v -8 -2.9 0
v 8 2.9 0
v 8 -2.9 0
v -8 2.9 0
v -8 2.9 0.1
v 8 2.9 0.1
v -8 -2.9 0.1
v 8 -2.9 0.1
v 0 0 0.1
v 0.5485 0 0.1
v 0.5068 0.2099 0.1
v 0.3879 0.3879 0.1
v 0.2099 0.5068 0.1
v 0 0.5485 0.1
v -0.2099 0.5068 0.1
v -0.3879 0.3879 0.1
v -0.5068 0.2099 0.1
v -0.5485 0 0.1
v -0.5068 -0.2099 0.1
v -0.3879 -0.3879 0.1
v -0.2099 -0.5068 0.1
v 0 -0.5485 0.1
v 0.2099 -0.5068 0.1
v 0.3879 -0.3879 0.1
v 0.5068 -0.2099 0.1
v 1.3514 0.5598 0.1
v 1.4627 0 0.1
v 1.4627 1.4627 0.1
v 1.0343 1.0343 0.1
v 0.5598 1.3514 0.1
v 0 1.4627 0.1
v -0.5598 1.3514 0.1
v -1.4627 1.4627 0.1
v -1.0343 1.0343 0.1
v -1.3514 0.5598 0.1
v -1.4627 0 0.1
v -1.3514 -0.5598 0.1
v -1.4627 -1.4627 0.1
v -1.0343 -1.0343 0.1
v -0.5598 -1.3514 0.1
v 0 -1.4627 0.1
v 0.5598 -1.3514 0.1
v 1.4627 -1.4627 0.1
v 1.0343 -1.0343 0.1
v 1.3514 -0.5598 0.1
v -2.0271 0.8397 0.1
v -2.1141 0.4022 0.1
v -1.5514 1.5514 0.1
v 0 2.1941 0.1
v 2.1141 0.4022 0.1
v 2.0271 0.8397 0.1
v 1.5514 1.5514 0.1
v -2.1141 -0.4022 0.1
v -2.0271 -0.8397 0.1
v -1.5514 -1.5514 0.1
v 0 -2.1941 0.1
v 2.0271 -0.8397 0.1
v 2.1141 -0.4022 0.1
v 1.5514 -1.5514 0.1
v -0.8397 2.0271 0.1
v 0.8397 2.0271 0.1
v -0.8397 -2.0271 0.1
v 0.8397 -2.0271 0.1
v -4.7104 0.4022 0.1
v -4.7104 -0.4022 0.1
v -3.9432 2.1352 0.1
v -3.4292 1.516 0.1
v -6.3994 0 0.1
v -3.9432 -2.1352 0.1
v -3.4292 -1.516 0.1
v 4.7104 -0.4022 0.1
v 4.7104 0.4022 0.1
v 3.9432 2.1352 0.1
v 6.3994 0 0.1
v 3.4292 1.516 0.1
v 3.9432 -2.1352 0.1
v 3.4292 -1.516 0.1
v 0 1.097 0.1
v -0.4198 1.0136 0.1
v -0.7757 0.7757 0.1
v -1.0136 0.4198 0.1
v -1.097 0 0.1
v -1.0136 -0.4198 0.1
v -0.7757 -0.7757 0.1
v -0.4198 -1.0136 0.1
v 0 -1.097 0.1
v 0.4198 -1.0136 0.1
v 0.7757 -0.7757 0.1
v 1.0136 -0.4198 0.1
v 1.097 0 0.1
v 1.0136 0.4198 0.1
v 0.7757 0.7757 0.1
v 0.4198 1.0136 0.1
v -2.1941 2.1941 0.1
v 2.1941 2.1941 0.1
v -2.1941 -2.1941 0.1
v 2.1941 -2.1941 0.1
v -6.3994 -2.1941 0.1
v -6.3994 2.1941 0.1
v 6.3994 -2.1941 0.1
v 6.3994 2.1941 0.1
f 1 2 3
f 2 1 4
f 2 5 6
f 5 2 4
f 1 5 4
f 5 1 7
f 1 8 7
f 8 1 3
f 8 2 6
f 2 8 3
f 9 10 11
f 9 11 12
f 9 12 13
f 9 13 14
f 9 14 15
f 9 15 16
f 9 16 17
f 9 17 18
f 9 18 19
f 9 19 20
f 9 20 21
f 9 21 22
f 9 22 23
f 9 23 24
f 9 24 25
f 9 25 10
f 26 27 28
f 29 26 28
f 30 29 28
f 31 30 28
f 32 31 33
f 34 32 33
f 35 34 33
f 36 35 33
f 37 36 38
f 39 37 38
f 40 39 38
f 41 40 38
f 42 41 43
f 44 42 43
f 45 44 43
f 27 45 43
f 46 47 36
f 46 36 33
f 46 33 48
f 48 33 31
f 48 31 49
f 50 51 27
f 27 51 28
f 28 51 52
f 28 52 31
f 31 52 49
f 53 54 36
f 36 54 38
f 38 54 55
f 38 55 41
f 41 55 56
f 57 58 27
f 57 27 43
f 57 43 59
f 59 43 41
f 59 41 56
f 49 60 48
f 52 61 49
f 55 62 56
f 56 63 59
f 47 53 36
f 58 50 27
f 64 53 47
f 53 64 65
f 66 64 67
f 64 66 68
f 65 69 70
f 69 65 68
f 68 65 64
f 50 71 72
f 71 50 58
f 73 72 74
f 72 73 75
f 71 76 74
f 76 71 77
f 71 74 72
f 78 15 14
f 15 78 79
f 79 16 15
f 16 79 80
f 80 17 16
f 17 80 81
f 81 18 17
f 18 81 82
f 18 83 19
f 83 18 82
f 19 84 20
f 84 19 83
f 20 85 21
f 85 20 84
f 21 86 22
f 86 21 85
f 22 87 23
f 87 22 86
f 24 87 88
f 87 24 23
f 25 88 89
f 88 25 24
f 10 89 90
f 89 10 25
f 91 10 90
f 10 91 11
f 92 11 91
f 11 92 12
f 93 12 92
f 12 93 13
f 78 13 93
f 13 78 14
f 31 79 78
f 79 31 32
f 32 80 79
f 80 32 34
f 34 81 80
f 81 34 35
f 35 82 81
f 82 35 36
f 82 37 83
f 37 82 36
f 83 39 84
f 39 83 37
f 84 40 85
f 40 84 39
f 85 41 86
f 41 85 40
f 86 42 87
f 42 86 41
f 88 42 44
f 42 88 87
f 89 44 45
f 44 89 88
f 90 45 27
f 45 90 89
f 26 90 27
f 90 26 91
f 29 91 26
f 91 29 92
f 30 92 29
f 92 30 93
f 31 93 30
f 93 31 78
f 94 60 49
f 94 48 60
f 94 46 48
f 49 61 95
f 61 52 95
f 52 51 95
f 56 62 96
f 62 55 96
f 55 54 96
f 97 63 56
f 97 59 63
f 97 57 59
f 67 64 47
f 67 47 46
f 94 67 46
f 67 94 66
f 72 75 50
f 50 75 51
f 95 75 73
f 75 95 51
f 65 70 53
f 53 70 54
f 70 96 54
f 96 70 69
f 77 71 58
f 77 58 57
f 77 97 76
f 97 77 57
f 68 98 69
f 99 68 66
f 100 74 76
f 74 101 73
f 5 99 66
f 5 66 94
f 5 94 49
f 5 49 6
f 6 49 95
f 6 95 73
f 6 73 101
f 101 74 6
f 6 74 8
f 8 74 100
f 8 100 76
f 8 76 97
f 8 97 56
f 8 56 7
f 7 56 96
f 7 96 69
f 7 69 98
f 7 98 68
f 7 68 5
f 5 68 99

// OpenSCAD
// file: ../p/empty.scad
use <../lib.scad>
function ldraw_lib__empty() = [
// 0 Empty
// 0 Name: empty.dat
// 0 Author: Steffen [Steffen]
// 0 !LDRAW_ORG Primitive UPDATE 2015-01
// 0 !LICENSE Licensed under CC BY 4.0 : see CAreadme.txt
// 
// 0 BFC CERTIFY CCW
  [0,"BFC","CERTIFY"],
  [0,"BFC","CCW"],
// 
// 0 !HISTORY 2015-10-11 [PTadmin] Official Update 2015-01
// 
// 
// 0 // Tool MLCad cannot handle really empty files. This file is used as a workaround.
// 0 // It exceptionally contains forbidden non-LDRAW standard syntax to satisfy MLCad until it is fixed OR a different editor has become the de-facto LDRAW standard.
// 0 // The line being used here is an "impossible" conditional line which never should be visible,
// 0 // additionally hidden by a syntax explicitly hiding it from displaying.
// 
// 0 MLCAD HIDE 5 24 0 0 0 0.0001 0 0 0.0001 -0.0001 0 0 0 0
];
module ldraw_lib__empty(step=0, col=false, unit=2/5, alt=false, line=0.2, solid=!$preview)
    makepoly(ldraw_lib__empty(), step=step, col=col, unit=unit, alt=alt, line=line, solid=solid);
ldraw_lib__empty(line=0.2);
// file: ../p/4-4ndis.scad
use <../lib.scad>
function ldraw_lib__4_4ndis() = [
// 0 Disc Negative 1.0
// 0 Name: 4-4ndis.dat
// 0 Author: James Jessiman
// 0 !LDRAW_ORG Primitive UPDATE 2012-01
// 0 !LICENSE Licensed under CC BY 4.0 : see CAreadme.txt
// 
// 0 BFC CERTIFY CCW
  [0,"BFC","CERTIFY"],
  [0,"BFC","CCW"],
// 
// 0 !HISTORY 2002-03-23 [sbliss] Added BFC statement; compacted code
// 0 !HISTORY 2002-04-25 [PTadmin] Official Update 2002-02
// 0 !HISTORY 2007-06-24 [PTadmin] Header formatted for Contributor Agreement
// 0 !HISTORY 2008-07-01 [PTadmin] Official Update 2008-01
// 0 !HISTORY 2012-02-16 [Philo] Changed to CCW
// 0 !HISTORY 2012-03-30 [PTadmin] Official Update 2012-01
// 
// 
// 3 16 0.9239 0 0.3827 1 0 0 1 0 1
  [3,16,0.9239,0,0.3827,1,0,0,1,0,1],
// 3 16 0.7071 0 0.7071 0.9239 0 0.3827 1 0 1
  [3,16,0.7071,0,0.7071,0.9239,0,0.3827,1,0,1],
// 3 16 0.3827 0 0.9239 0.7071 0 0.7071 1 0 1
  [3,16,0.3827,0,0.9239,0.7071,0,0.7071,1,0,1],
// 3 16 0 0 1 0.3827 0 0.9239 1 0 1
  [3,16,0,0,1,0.3827,0,0.9239,1,0,1],
// 3 16 -0.3827 0 0.9239 0 0 1 -1 0 1
  [3,16,-0.3827,0,0.9239,0,0,1,-1,0,1],
// 3 16 -0.7071 0 0.7071 -0.3827 0 0.9239 -1 0 1
  [3,16,-0.7071,0,0.7071,-0.3827,0,0.9239,-1,0,1],
// 3 16 -0.9239 0 0.3827 -0.7071 0 0.7071 -1 0 1
  [3,16,-0.9239,0,0.3827,-0.7071,0,0.7071,-1,0,1],
// 3 16 -1 0 0 -0.9239 0 0.3827 -1 0 1
  [3,16,-1,0,0,-0.9239,0,0.3827,-1,0,1],
// 3 16 -0.9239 0 -0.3827 -1 0 0 -1 0 -1
  [3,16,-0.9239,0,-0.3827,-1,0,0,-1,0,-1],
// 3 16 -0.7071 0 -0.7071 -0.9239 0 -0.3827 -1 0 -1
  [3,16,-0.7071,0,-0.7071,-0.9239,0,-0.3827,-1,0,-1],
// 3 16 -0.3827 0 -0.9239 -0.7071 0 -0.7071 -1 0 -1
  [3,16,-0.3827,0,-0.9239,-0.7071,0,-0.7071,-1,0,-1],
// 3 16 0 0 -1 -0.3827 0 -0.9239 -1 0 -1
  [3,16,0,0,-1,-0.3827,0,-0.9239,-1,0,-1],
// 3 16 0.3827 0 -0.9239 0 0 -1 1 0 -1
  [3,16,0.3827,0,-0.9239,0,0,-1,1,0,-1],
// 3 16 0.7071 0 -0.7071 0.3827 0 -0.9239 1 0 -1
  [3,16,0.7071,0,-0.7071,0.3827,0,-0.9239,1,0,-1],
// 3 16 0.9239 0 -0.3827 0.7071 0 -0.7071 1 0 -1
  [3,16,0.9239,0,-0.3827,0.7071,0,-0.7071,1,0,-1],
// 3 16 1 0 0 0.9239 0 -0.3827 1 0 -1
  [3,16,1,0,0,0.9239,0,-0.3827,1,0,-1],
];
module ldraw_lib__4_4ndis(step=0, col=false, unit=2/5, alt=false, line=0.2, solid=!$preview)
    makepoly(ldraw_lib__4_4ndis(), step=step, col=col, unit=unit, alt=alt, line=line, solid=solid);
ldraw_lib__4_4ndis(line=0.2);
// file: ../p/4-4disc.scad
use <../lib.scad>
function ldraw_lib__4_4disc() = [
// 0 Disc 1.0
// 0 Name: 4-4disc.dat
// 0 Author: James Jessiman
// 0 !LDRAW_ORG Primitive UPDATE 2002-02
// 0 !LICENSE Licensed under CC BY 4.0 : see CAreadme.txt
// 
// 0 BFC CERTIFY CCW
  [0,"BFC","CERTIFY"],
  [0,"BFC","CCW"],
// 
// 0 !HISTORY 1998-12-15 [PTadmin] Official Update 1998-10
// 0 !HISTORY 2002-03-23 [sbliss] Added BFC statement
// 0 !HISTORY 2002-04-25 [PTadmin] Official Update 2002-02
// 0 !HISTORY 2007-06-24 [PTadmin] Header formatted for Contributor Agreement
// 0 !HISTORY 2008-07-01 [PTadmin] Official Update 2008-01
// 
// 
// 3 16 0 0 0 1 0 0 0.9239 0 0.3827
  [3,16,0,0,0,1,0,0,0.9239,0,0.3827],
// 3 16 0 0 0 0.9239 0 0.3827 0.7071 0 0.7071
  [3,16,0,0,0,0.9239,0,0.3827,0.7071,0,0.7071],
// 3 16 0 0 0 0.7071 0 0.7071 0.3827 0 0.9239
  [3,16,0,0,0,0.7071,0,0.7071,0.3827,0,0.9239],
// 3 16 0 0 0 0.3827 0 0.9239 0 0 1
  [3,16,0,0,0,0.3827,0,0.9239,0,0,1],
// 3 16 0 0 0 0 0 1 -0.3827 0 0.9239
  [3,16,0,0,0,0,0,1,-0.3827,0,0.9239],
// 3 16 0 0 0 -0.3827 0 0.9239 -0.7071 0 0.7071
  [3,16,0,0,0,-0.3827,0,0.9239,-0.7071,0,0.7071],
// 3 16 0 0 0 -0.7071 0 0.7071 -0.9239 0 0.3827
  [3,16,0,0,0,-0.7071,0,0.7071,-0.9239,0,0.3827],
// 3 16 0 0 0 -0.9239 0 0.3827 -1 0 -0
  [3,16,0,0,0,-0.9239,0,0.3827,-1,0,-0],
// 3 16 0 0 0 -1 0 -0 -0.9239 0 -0.3827
  [3,16,0,0,0,-1,0,-0,-0.9239,0,-0.3827],
// 3 16 0 0 0 -0.9239 0 -0.3827 -0.7071 0 -0.7071
  [3,16,0,0,0,-0.9239,0,-0.3827,-0.7071,0,-0.7071],
// 3 16 0 0 0 -0.7071 0 -0.7071 -0.3827 0 -0.9239
  [3,16,0,0,0,-0.7071,0,-0.7071,-0.3827,0,-0.9239],
// 3 16 0 0 0 -0.3827 0 -0.9239 0 0 -1
  [3,16,0,0,0,-0.3827,0,-0.9239,0,0,-1],
// 3 16 0 0 0 0 0 -1 0.3827 0 -0.9239
  [3,16,0,0,0,0,0,-1,0.3827,0,-0.9239],
// 3 16 0 0 0 0.3827 0 -0.9239 0.7071 0 -0.7071
  [3,16,0,0,0,0.3827,0,-0.9239,0.7071,0,-0.7071],
// 3 16 0 0 0 0.7071 0 -0.7071 0.9239 0 -0.3827
  [3,16,0,0,0,0.7071,0,-0.7071,0.9239,0,-0.3827],
// 3 16 0 0 0 0.9239 0 -0.3827 1 0 0
  [3,16,0,0,0,0.9239,0,-0.3827,1,0,0],
// 0
];
module ldraw_lib__4_4disc(step=0, col=false, unit=2/5, alt=false, line=0.2, solid=!$preview)
    makepoly(ldraw_lib__4_4disc(), step=step, col=col, unit=unit, alt=alt, line=line, solid=solid);
ldraw_lib__4_4disc(line=0.2);
// file: ../p/1-8chrd.scad
use <../lib.scad>
function ldraw_lib__1_8chrd() = [
// 0 Chord 0.125
// 0 Name: 1-8chrd.dat
// 0 Author: Orion Pobursky [OrionP]
// 0 !LDRAW_ORG Primitive UPDATE 2023-05
// 0 !LICENSE Licensed under CC BY 4.0 : see CAreadme.txt
// 
// 0 BFC CERTIFY CCW
  [0,"BFC","CERTIFY"],
  [0,"BFC","CCW"],
// 
// 0 !HISTORY 2004-04-22 [PTadmin] Official Update 2004-02
// 0 !HISTORY 2007-06-22 [PTadmin] Header formatted for Contributor Agreement
// 0 !HISTORY 2008-07-01 [PTadmin] Official Update 2008-01
// 0 !HISTORY 2023-10-27 [OrionP] Rebuilt with PrimGen2, original author westrate
// 0 !HISTORY 2023-10-31 [OrionP] Official Update 2023-05
// 
// 3 16 1 0 0 0.9239 0 0.3827 0.7071 0 0.7071
  [3,16,1,0,0,0.9239,0,0.3827,0.7071,0,0.7071],
];
module ldraw_lib__1_8chrd(step=0, col=false, unit=2/5, alt=false, line=0.2, solid=!$preview)
    makepoly(ldraw_lib__1_8chrd(), step=step, col=col, unit=unit, alt=alt, line=line, solid=solid);
ldraw_lib__1_8chrd(line=0.2);
// file: ../p/1-16chrd.scad
use <../lib.scad>
use <empty.scad>
function ldraw_lib__1_16chrd() = [
// 0 Chord 0.0625
// 0 Name: 1-16chrd.dat
// 0 Author: Philippe Hurbain [Philo]
// 0 !LDRAW_ORG Primitive UPDATE 2015-01
// 0 !LICENSE Licensed under CC BY 4.0 : see CAreadme.txt
// 
// 0 BFC CERTIFY CCW
  [0,"BFC","CERTIFY"],
  [0,"BFC","CCW"],
// 
// 0 !HISTORY 2015-10-11 [PTadmin] Official Update 2015-01
// 
// 
// 0 // This file is intentionally empty because at the current \P resolution,
// 0 // an 1-16chrd is actually empty. However, this file still is present
// 0 // to allow tools to do primitives substition and fill in a real chrd here,
// 0 // or, if desired, to substitute this with the hi-res 48\1-16chrd.
// 
// 0 // This file is based on an idea by Darats at http://forums.ldraw.org/read.php?19,14500,14500#msg-14500
// 
// 1 16 0 0 0 1 0 0 0 1 0 0 0 1 empty.dat
  [1,16,0,0,0,1,0,0,0,1,0,0,0,1, ldraw_lib__empty()],
];
module ldraw_lib__1_16chrd(step=0, col=false, unit=2/5, alt=false, line=0.2, solid=!$preview)
    makepoly(ldraw_lib__1_16chrd(), step=step, col=col, unit=unit, alt=alt, line=line, solid=solid);
ldraw_lib__1_16chrd(line=0.2);
// file: ../p/4-4ring3.scad
use <../lib.scad>
function ldraw_lib__4_4ring3() = [
// 0 Ring  3 x 1.0
// 0 Name: 4-4ring3.dat
// 0 Author: James Jessiman
// 0 !LDRAW_ORG Primitive UPDATE 2009-01
// 0 !LICENSE Licensed under CC BY 4.0 : see CAreadme.txt
// 
// 0 BFC CERTIFY CCW
  [0,"BFC","CERTIFY"],
  [0,"BFC","CCW"],
// 
// 0 !HISTORY 1998-12-15 [PTadmin] Official Update 1998-10
// 0 !HISTORY 2002-04-05 [hafhead] Added BFC statement
// 0 !HISTORY 2002-04-25 [PTadmin] Official Update 2002-02
// 0 !HISTORY 2007-06-24 [PTadmin] Header formatted for Contributor Agreement
// 0 !HISTORY 2008-07-01 [PTadmin] Official Update 2008-01
// 0 !HISTORY 2008-08-26 [cwdee] Switch polygon winding and rename
// 0 !HISTORY 2009-05-02 [PTadmin] Official Update 2009-01
// 
// 
// 4 16 -1.5308 0 3.6956 -1.1481 0 2.7717 0 0 3 0 0 4
  [4,16,-1.5308,0,3.6956,-1.1481,0,2.7717,0,0,3,0,0,4],
// 4 16 -2.8284 0 2.8284 -2.1213 0 2.1213 -1.1481 0 2.7717 -1.5308 0 3.6956
  [4,16,-2.8284,0,2.8284,-2.1213,0,2.1213,-1.1481,0,2.7717,-1.5308,0,3.6956],
// 4 16 -3.6956 0 1.5308 -2.7717 0 1.1481 -2.1213 0 2.1213 -2.8284 0 2.8284
  [4,16,-3.6956,0,1.5308,-2.7717,0,1.1481,-2.1213,0,2.1213,-2.8284,0,2.8284],
// 4 16 -4 0 0 -3 0 0 -2.7717 0 1.1481 -3.6956 0 1.5308
  [4,16,-4,0,0,-3,0,0,-2.7717,0,1.1481,-3.6956,0,1.5308],
// 4 16 -3.6956 0 -1.5308 -2.7717 0 -1.1481 -3 0 0 -4 0 0
  [4,16,-3.6956,0,-1.5308,-2.7717,0,-1.1481,-3,0,0,-4,0,0],
// 4 16 -2.8284 0 -2.8284 -2.1213 0 -2.1213 -2.7717 0 -1.1481 -3.6956 0 -1.5308
  [4,16,-2.8284,0,-2.8284,-2.1213,0,-2.1213,-2.7717,0,-1.1481,-3.6956,0,-1.5308],
// 4 16 -1.5308 0 -3.6956 -1.1481 0 -2.7717 -2.1213 0 -2.1213 -2.8284 0 -2.8284
  [4,16,-1.5308,0,-3.6956,-1.1481,0,-2.7717,-2.1213,0,-2.1213,-2.8284,0,-2.8284],
// 4 16 0 0 -4 0 0 -3 -1.1481 0 -2.7717 -1.5308 0 -3.6956
  [4,16,0,0,-4,0,0,-3,-1.1481,0,-2.7717,-1.5308,0,-3.6956],
// 4 16 1.5308 0 -3.6956 1.1481 0 -2.7717 0 0 -3 0 0 -4
  [4,16,1.5308,0,-3.6956,1.1481,0,-2.7717,0,0,-3,0,0,-4],
// 4 16 2.8284 0 -2.8284 2.1213 0 -2.1213 1.1481 0 -2.7717 1.5308 0 -3.6956
  [4,16,2.8284,0,-2.8284,2.1213,0,-2.1213,1.1481,0,-2.7717,1.5308,0,-3.6956],
// 4 16 3.6956 0 -1.5308 2.7717 0 -1.1481 2.1213 0 -2.1213 2.8284 0 -2.8284
  [4,16,3.6956,0,-1.5308,2.7717,0,-1.1481,2.1213,0,-2.1213,2.8284,0,-2.8284],
// 4 16 4 0 0 3 0 0 2.7717 0 -1.1481 3.6956 0 -1.5308
  [4,16,4,0,0,3,0,0,2.7717,0,-1.1481,3.6956,0,-1.5308],
// 4 16 3.6956 0 1.5308 2.7717 0 1.1481 3 0 0 4 0 0
  [4,16,3.6956,0,1.5308,2.7717,0,1.1481,3,0,0,4,0,0],
// 4 16 2.8284 0 2.8284 2.1213 0 2.1213 2.7717 0 1.1481 3.6956 0 1.5308
  [4,16,2.8284,0,2.8284,2.1213,0,2.1213,2.7717,0,1.1481,3.6956,0,1.5308],
// 4 16 1.5308 0 3.6956 1.1481 0 2.7717 2.1213 0 2.1213 2.8284 0 2.8284
  [4,16,1.5308,0,3.6956,1.1481,0,2.7717,2.1213,0,2.1213,2.8284,0,2.8284],
// 4 16 0 0 4 0 0 3 1.1481 0 2.7717 1.5308 0 3.6956
  [4,16,0,0,4,0,0,3,1.1481,0,2.7717,1.5308,0,3.6956],
// 0
];
module ldraw_lib__4_4ring3(step=0, col=false, unit=2/5, alt=false, line=0.2, solid=!$preview)
    makepoly(ldraw_lib__4_4ring3(), step=step, col=col, unit=unit, alt=alt, line=line, solid=solid);
ldraw_lib__4_4ring3(line=0.2);
// file: ../p/4-4ring1.scad
use <../lib.scad>
function ldraw_lib__4_4ring1() = [
// 0 Ring  1 x 1.0
// 0 Name: 4-4ring1.dat
// 0 Author: James Jessiman
// 0 !LDRAW_ORG Primitive UPDATE 2009-01
// 0 !LICENSE Licensed under CC BY 4.0 : see CAreadme.txt
// 
// 0 BFC CERTIFY CCW
  [0,"BFC","CERTIFY"],
  [0,"BFC","CCW"],
// 
// 0 !HISTORY 1998-12-15 [PTadmin] Official Update 1998-10
// 0 !HISTORY 2002-04-08 [BrickCaster] Modified for BFC compliance
// 0 !HISTORY 2002-04-25 [PTadmin] Official Update 2002-02
// 0 !HISTORY 2007-06-24 [PTadmin] Header formatted for Contributor Agreement
// 0 !HISTORY 2008-07-01 [PTadmin] Official Update 2008-01
// 0 !HISTORY 2008-08-26 [cwdee] Switch polygon winding and rename
// 0 !HISTORY 2009-05-02 [PTadmin] Official Update 2009-01
// 
// 
// 4 16 -0.7654 0 1.8478 -0.3827 0 0.9239 0 0 1 0 0 2
  [4,16,-0.7654,0,1.8478,-0.3827,0,0.9239,0,0,1,0,0,2],
// 4 16 -1.4142 0 1.4142 -0.7071 0 0.7071 -0.3827 0 0.9239 -0.7654 0 1.8478
  [4,16,-1.4142,0,1.4142,-0.7071,0,0.7071,-0.3827,0,0.9239,-0.7654,0,1.8478],
// 4 16 -1.8478 0 0.7654 -0.9239 0 0.3827 -0.7071 0 0.7071 -1.4142 0 1.41420
  [4,16,-1.8478,0,0.7654,-0.9239,0,0.3827,-0.7071,0,0.7071,-1.4142,0,1.41420],
// 4 16 -2 0 0 -1 0 0 -0.9239 0 0.3827 -1.8478 0 0.7654
  [4,16,-2,0,0,-1,0,0,-0.9239,0,0.3827,-1.8478,0,0.7654],
// 4 16 -1.8478 0 -0.7654 -0.9239 0 -0.3827 -1 0 0 -2 0 0
  [4,16,-1.8478,0,-0.7654,-0.9239,0,-0.3827,-1,0,0,-2,0,0],
// 4 16 -1.4142 0 -1.4142 -0.7071 0 -0.7071 -0.9239 0 -0.3827 -1.8478 0 -0.7654
  [4,16,-1.4142,0,-1.4142,-0.7071,0,-0.7071,-0.9239,0,-0.3827,-1.8478,0,-0.7654],
// 4 16 -0.7654 0 -1.8478 -0.3827 0 -0.9239 -0.7071 0 -0.7071 -1.4142 0 -1.4142
  [4,16,-0.7654,0,-1.8478,-0.3827,0,-0.9239,-0.7071,0,-0.7071,-1.4142,0,-1.4142],
// 4 16 0 0 -2 0 0 -1 -0.3827 0 -0.9239 -0.7654 0 -1.8478
  [4,16,0,0,-2,0,0,-1,-0.3827,0,-0.9239,-0.7654,0,-1.8478],
// 4 16 0.7654 0 -1.8478 0.3827 0 -0.9239 0 0 -1 0 0 -2
  [4,16,0.7654,0,-1.8478,0.3827,0,-0.9239,0,0,-1,0,0,-2],
// 4 16 1.4142 0 -1.4142 0.7071 0 -0.7071 0.3827 0 -0.9239 0.7654 0 -1.8478
  [4,16,1.4142,0,-1.4142,0.7071,0,-0.7071,0.3827,0,-0.9239,0.7654,0,-1.8478],
// 4 16 1.8478 0 -0.7654 0.9239 0 -0.3827 0.7071 0 -0.7071 1.4142 0 -1.4142
  [4,16,1.8478,0,-0.7654,0.9239,0,-0.3827,0.7071,0,-0.7071,1.4142,0,-1.4142],
// 4 16 2 0 0 1 0 0 0.9239 0 -0.3827 1.8478 0 -0.7654
  [4,16,2,0,0,1,0,0,0.9239,0,-0.3827,1.8478,0,-0.7654],
// 4 16 1.8478 0 0.7654 0.9239 0 0.3827 1 0 0 2 0 0
  [4,16,1.8478,0,0.7654,0.9239,0,0.3827,1,0,0,2,0,0],
// 4 16 1.4142 0 1.4142 0.7071 0 0.7071 0.9239 0 0.3827 1.8478 0 0.7654
  [4,16,1.4142,0,1.4142,0.7071,0,0.7071,0.9239,0,0.3827,1.8478,0,0.7654],
// 4 16 0.7654 0 1.8478 0.3827 0 0.9239 0.7071 0 0.7071 1.4142 0 1.4142
  [4,16,0.7654,0,1.8478,0.3827,0,0.9239,0.7071,0,0.7071,1.4142,0,1.4142],
// 4 16 0 0 2 0 0 1 0.3827 0 0.9239 0.7654 0 1.8478
  [4,16,0,0,2,0,0,1,0.3827,0,0.9239,0.7654,0,1.8478],
// 0
];
module ldraw_lib__4_4ring1(step=0, col=false, unit=2/5, alt=false, line=0.2, solid=!$preview)
    makepoly(ldraw_lib__4_4ring1(), step=step, col=col, unit=unit, alt=alt, line=line, solid=solid);
ldraw_lib__4_4ring1(line=0.2);
// file: ../p/3-16ndis.scad
use <../lib.scad>
function ldraw_lib__3_16ndis() = [
// 0 Disc Negative 0.1875
// 0 Name: 3-16ndis.dat
// 0 Author: Guy Vivan [guyvivan]
// 0 !LDRAW_ORG Primitive UPDATE 2009-01
// 0 !LICENSE Licensed under CC BY 2.0 and CC BY 4.0 : see CAreadme.txt
// 
// 0 BFC CERTIFY CCW
  [0,"BFC","CERTIFY"],
  [0,"BFC","CCW"],
// 
// 0 !HISTORY 2009-05-02 [PTadmin] Official Update 2009-01
// 
// 
// 3 16 1 0 1 0.9239 0 0.3827 1 0 0
  [3,16,1,0,1,0.9239,0,0.3827,1,0,0],
// 3 16 1 0 1 0.7071 0 0.7071 0.9239 0 0.3827
  [3,16,1,0,1,0.7071,0,0.7071,0.9239,0,0.3827],
// 3 16 1 0 1 0.3827 0 0.9239 0.7071 0 0.7071
  [3,16,1,0,1,0.3827,0,0.9239,0.7071,0,0.7071],
// 
// 0 end of file
// 
];
module ldraw_lib__3_16ndis(step=0, col=false, unit=2/5, alt=false, line=0.2, solid=!$preview)
    makepoly(ldraw_lib__3_16ndis(), step=step, col=col, unit=unit, alt=alt, line=line, solid=solid);
ldraw_lib__3_16ndis(line=0.2);
// file: ../p/logo-train-2006.scad
use <../lib.scad>
use <1-16chrd.scad>
use <1-8chrd.scad>
use <4-4disc.scad>
use <4-4ndis.scad>
function ldraw_lib__logo_train_2006() = [
// 0 Logo Train 2006
// 0 Name: logo-train-2006.dat
// 0 Author: Gerald Lasser [GeraldLasser]
// 0 !LDRAW_ORG Primitive UPDATE 2023-07
// 0 !LICENSE Licensed under CC BY 4.0 : see CAreadme.txt
// 
// 0 BFC CERTIFY CCW
  [0,"BFC","CERTIFY"],
  [0,"BFC","CCW"],
// 
// 0 !HISTORY 2023-12-31 [OrionP] Official Update 2023-07
// 
// 
// 1 16 0 -.25 0 3 0 0 0 1 0 0 0 3 4-4disc.dat
  [1,16,0,-.25,0,3,0,0,0,1,0,0,0,3, ldraw_lib__4_4disc()],
// 1 16 0 -.25 0 8 0 0 0 1 0 0 0 8 4-4ndis.dat
  [1,16,0,-.25,0,8,0,0,0,1,0,0,0,8, ldraw_lib__4_4ndis()],
// 3 16 -11.0868 -.25 4.5924 -11.5625 -.25 2.2 -8 -.25 0
  [3,16,-11.0868,-.25,4.5924,-11.5625,-.25,2.2,-8,-.25,0],
// 3 16 -11.0868 -.25 4.5924 -8 -.25 0 -8 -.25 8
  [3,16,-11.0868,-.25,4.5924,-8,-.25,0,-8,-.25,8],
// 3 16 -11.0868 -.25 4.5924 -8 -.25 8 -8.4852 -.25 8.4852
  [3,16,-11.0868,-.25,4.5924,-8,-.25,8,-8.4852,-.25,8.4852],
// 3 16 -8.4852 -.25 8.4852 -8 -.25 8 0 -.25 8
  [3,16,-8.4852,-.25,8.4852,-8,-.25,8,0,-.25,8],
// 3 16 -8.4852 -.25 8.4852 0 -.25 8 0 -.25 12
  [3,16,-8.4852,-.25,8.4852,0,-.25,8,0,-.25,12],
// 3 16 11.5625 -.25 2.2 11.0868 -.25 4.5924 8 -.25 0
  [3,16,11.5625,-.25,2.2,11.0868,-.25,4.5924,8,-.25,0],
// 3 16 8 -.25 0 11.0868 -.25 4.5924 8 -.25 8
  [3,16,8,-.25,0,11.0868,-.25,4.5924,8,-.25,8],
// 3 16 8 -.25 8 11.0868 -.25 4.5924 8.4852 -.25 8.4852
  [3,16,8,-.25,8,11.0868,-.25,4.5924,8.4852,-.25,8.4852],
// 3 16 8 -.25 8 8.4852 -.25 8.4852 0 -.25 8
  [3,16,8,-.25,8,8.4852,-.25,8.4852,0,-.25,8],
// 3 16 0 -.25 8 8.4852 -.25 8.4852 0 -.25 12
  [3,16,0,-.25,8,8.4852,-.25,8.4852,0,-.25,12],
// 
// 3 16 -11.5625 -.25 -2.2 -11.0868 -.25 -4.5924 -8 -.25 0
  [3,16,-11.5625,-.25,-2.2,-11.0868,-.25,-4.5924,-8,-.25,0],
// 3 16 -8 -.25 0 -11.0868 -.25 -4.5924 -8 -.25 -8
  [3,16,-8,-.25,0,-11.0868,-.25,-4.5924,-8,-.25,-8],
// 3 16 -8 -.25 -8 -11.0868 -.25 -4.5924 -8.4852 -.25 -8.4852
  [3,16,-8,-.25,-8,-11.0868,-.25,-4.5924,-8.4852,-.25,-8.4852],
// 3 16 -8 -.25 -8 -8.4852 -.25 -8.4852 0 -.25 -8
  [3,16,-8,-.25,-8,-8.4852,-.25,-8.4852,0,-.25,-8],
// 3 16 0 -.25 -8 -8.4852 -.25 -8.4852 0 -.25 -12
  [3,16,0,-.25,-8,-8.4852,-.25,-8.4852,0,-.25,-12],
// 3 16 11.0868 -.25 -4.5924 11.5625 -.25 -2.2 8 -.25 0
  [3,16,11.0868,-.25,-4.5924,11.5625,-.25,-2.2,8,-.25,0],
// 3 16 11.0868 -.25 -4.5924 8 -.25 0 8 -.25 -8
  [3,16,11.0868,-.25,-4.5924,8,-.25,0,8,-.25,-8],
// 3 16 11.0868 -.25 -4.5924 8 -.25 -8 8.4852 -.25 -8.4852
  [3,16,11.0868,-.25,-4.5924,8,-.25,-8,8.4852,-.25,-8.4852],
// 3 16 8.4852 -.25 -8.4852 8 -.25 -8 0 -.25 -8
  [3,16,8.4852,-.25,-8.4852,8,-.25,-8,0,-.25,-8],
// 3 16 8.4852 -.25 -8.4852 0 -.25 -8 0 -.25 -12
  [3,16,8.4852,-.25,-8.4852,0,-.25,-8,0,-.25,-12],
// 
// 1 16 0 -.25 0 0 0 -12 0 1 0 12 0 0 1-8chrd.dat
  [1,16,0,-.25,0,0,0,-12,0,1,0,12,0,0, ldraw_lib__1_8chrd()],
// 1 16 0 -.25 0 0 0 12 0 1 0 12 0 0 1-8chrd.dat
  [1,16,0,-.25,0,0,0,12,0,1,0,12,0,0, ldraw_lib__1_8chrd()],
// 1 16 0 -.25 0 -8.48528 0 -8.48528 0 1 0 8.48528 0 -8.48528 1-16chrd.dat
  [1,16,0,-.25,0,-8.48528,0,-8.48528,0,1,0,8.48528,0,-8.48528, ldraw_lib__1_16chrd()],
// 1 16 0 -.25 0 8.48528 0 8.48528 0 1 0 8.48528 0 -8.48528 1-16chrd.dat
  [1,16,0,-.25,0,8.48528,0,8.48528,0,1,0,8.48528,0,-8.48528, ldraw_lib__1_16chrd()],
// 1 16 0 -.25 0 0 0 -12 0 1 0 -12 0 0 1-8chrd.dat
  [1,16,0,-.25,0,0,0,-12,0,1,0,-12,0,0, ldraw_lib__1_8chrd()],
// 1 16 0 -.25 0 0 0 12 0 1 0 -12 0 0 1-8chrd.dat
  [1,16,0,-.25,0,0,0,12,0,1,0,-12,0,0, ldraw_lib__1_8chrd()],
// 1 16 0 -.25 0 -8.48528 0 -8.48528 0 1 0 -8.48528 0 8.48528 1-16chrd.dat
  [1,16,0,-.25,0,-8.48528,0,-8.48528,0,1,0,-8.48528,0,8.48528, ldraw_lib__1_16chrd()],
// 1 16 0 -.25 0 8.48528 0 8.48528 0 1 0 -8.48528 0 8.48528 1-16chrd.dat
  [1,16,0,-.25,0,8.48528,0,8.48528,0,1,0,-8.48528,0,8.48528, ldraw_lib__1_16chrd()],
// 
// 3 16 -11.5625 -.25 2.2 -11.5625 -.25 -2.2 -8 -.25 0
  [3,16,-11.5625,-.25,2.2,-11.5625,-.25,-2.2,-8,-.25,0],
// 3 16 11.5625 -.25 -2.2 11.5625 -.25 2.2 8 -.25 0
  [3,16,11.5625,-.25,-2.2,11.5625,-.25,2.2,8,-.25,0],
// 4 16 -25.7625 -.25 2.2 -25.7625 -.25 -2.2 -11.5625 -.25 -2.2 -11.5625 -.25 2.2
  [4,16,-25.7625,-.25,2.2,-25.7625,-.25,-2.2,-11.5625,-.25,-2.2,-11.5625,-.25,2.2],
// 4 16 -35 -.25 0 -25.7625 -.25 2.2 -18.755 -.25 8.2915 -21.5662 -.25 11.6778
  [4,16,-35,-.25,0,-25.7625,-.25,2.2,-18.755,-.25,8.2915,-21.5662,-.25,11.6778],
// 4 16 -18.755 -.25 -8.2915 -25.7625 -.25 -2.2 -35 -.25 0 -21.5662 -.25 -11.6778
  [4,16,-18.755,-.25,-8.2915,-25.7625,-.25,-2.2,-35,-.25,0,-21.5662,-.25,-11.6778],
// 3 16 -35 -.25 0 -25.7625 -.25 -2.2 -25.7625 -.25 2.2
  [3,16,-35,-.25,0,-25.7625,-.25,-2.2,-25.7625,-.25,2.2],
// 4 16 11.5625 -.25 -2.2 25.7625 -.25 -2.2 25.7625 -.25 2.2 11.5625 -.25 2.2
  [4,16,11.5625,-.25,-2.2,25.7625,-.25,-2.2,25.7625,-.25,2.2,11.5625,-.25,2.2],
// 4 16 18.755 -.25 8.2915 25.7625 -.25 2.2 35 -.25 0 21.5662 -.25 11.6778
  [4,16,18.755,-.25,8.2915,25.7625,-.25,2.2,35,-.25,0,21.5662,-.25,11.6778],
// 4 16 35 -.25 0 25.7625 -.25 -2.2 18.755 -.25 -8.2915 21.5662 -.25 -11.6778
  [4,16,35,-.25,0,25.7625,-.25,-2.2,18.755,-.25,-8.2915,21.5662,-.25,-11.6778],
// 3 16 25.7625 -.25 -2.2 35 -.25 0 25.7625 -.25 2.2
  [3,16,25.7625,-.25,-2.2,35,-.25,0,25.7625,-.25,2.2],
];
module ldraw_lib__logo_train_2006(step=0, col=false, unit=2/5, alt=false, line=0.2, solid=!$preview)
    makepoly(ldraw_lib__logo_train_2006(), step=step, col=col, unit=unit, alt=alt, line=line, solid=solid);
ldraw_lib__logo_train_2006(line=0.2);
// file: ../p/logo-train-2006-box.scad
use <../lib.scad>
use <3-16ndis.scad>
use <4-4ring1.scad>
use <4-4ring3.scad>
function ldraw_lib__logo_train_2006_box() = [
// 0 Logo Train 2006 Outer Box
// 0 Name: logo-train-2006-box.dat
// 0 Author: Gerald Lasser [GeraldLasser]
// 0 !LDRAW_ORG Primitive UPDATE 2023-07
// 0 !LICENSE Licensed under CC BY 4.0 : see CAreadme.txt
// 
// 0 BFC CERTIFY CCW
  [0,"BFC","CERTIFY"],
  [0,"BFC","CCW"],
// 
// 0 !HISTORY 2023-12-31 [OrionP] Official Update 2023-07
// 
// 
// 1 16 0 -.25 0 3 0 0 0 1 0 0 0 3 4-4ring1.dat
  [1,16,0,-.25,0,3,0,0,0,1,0,0,0,3, ldraw_lib__4_4ring1()],
// 1 16 0 -.25 0 2 0 0 0 1 0 0 0 2 4-4ring3.dat
  [1,16,0,-.25,0,2,0,0,0,1,0,0,0,2, ldraw_lib__4_4ring3()],
// 1 16 0 -.25 0 0 0 -12 0 1 0 12 0 0 3-16ndis.dat
  [1,16,0,-.25,0,0,0,-12,0,1,0,12,0,0, ldraw_lib__3_16ndis()],
// 1 16 0 -.25 0 0 0 12 0 1 0 12 0 0 3-16ndis.dat
  [1,16,0,-.25,0,0,0,12,0,1,0,12,0,0, ldraw_lib__3_16ndis()],
// 1 16 0 -.25 0 0 0 -12 0 1 0 -12 0 0 3-16ndis.dat
  [1,16,0,-.25,0,0,0,-12,0,1,0,-12,0,0, ldraw_lib__3_16ndis()],
// 1 16 0 -.25 0 0 0 12 0 1 0 -12 0 0 3-16ndis.dat
  [1,16,0,-.25,0,0,0,12,0,1,0,-12,0,0, ldraw_lib__3_16ndis()],
// 
// 3 16 -18.755 -.25 8.2915 -25.7625 -.25 2.2 -11.5625 -.25 2.2
  [3,16,-18.755,-.25,8.2915,-25.7625,-.25,2.2,-11.5625,-.25,2.2],
// 3 16 -18.755 -.25 8.2915 -11.5625 -.25 2.2 -11.0868 -.25 4.5924
  [3,16,-18.755,-.25,8.2915,-11.5625,-.25,2.2,-11.0868,-.25,4.5924],
// 4 16 -12 -.25 12 -21.5662 -.25 11.6778 -18.755 -.25 8.2915 -11.0868 -.25 4.5924
  [4,16,-12,-.25,12,-21.5662,-.25,11.6778,-18.755,-.25,8.2915,-11.0868,-.25,4.5924],
// 3 16 25.7625 -.25 2.2 18.755 -.25 8.2915 11.5625 -.25 2.2
  [3,16,25.7625,-.25,2.2,18.755,-.25,8.2915,11.5625,-.25,2.2],
// 3 16 11.5625 -.25 2.2 18.755 -.25 8.2915 11.0868 -.25 4.5924
  [3,16,11.5625,-.25,2.2,18.755,-.25,8.2915,11.0868,-.25,4.5924],
// 4 16 18.755 -.25 8.2915 21.5662 -.25 11.6778 12 -.25 12 11.0868 -.25 4.5924
  [4,16,18.755,-.25,8.2915,21.5662,-.25,11.6778,12,-.25,12,11.0868,-.25,4.5924],
// 3 16 -25.7625 -.25 -2.2 -18.755 -.25 -8.2915 -11.5625 -.25 -2.2
  [3,16,-25.7625,-.25,-2.2,-18.755,-.25,-8.2915,-11.5625,-.25,-2.2],
// 3 16 -11.5625 -.25 -2.2 -18.755 -.25 -8.2915 -11.0868 -.25 -4.5924
  [3,16,-11.5625,-.25,-2.2,-18.755,-.25,-8.2915,-11.0868,-.25,-4.5924],
// 4 16 -18.755 -.25 -8.2915 -21.5662 -.25 -11.6778 -12 -.25 -12 -11.0868 -.25 -4.5924
  [4,16,-18.755,-.25,-8.2915,-21.5662,-.25,-11.6778,-12,-.25,-12,-11.0868,-.25,-4.5924],
// 3 16 18.755 -.25 -8.2915 25.7625 -.25 -2.2 11.5625 -.25 -2.2
  [3,16,18.755,-.25,-8.2915,25.7625,-.25,-2.2,11.5625,-.25,-2.2],
// 3 16 18.755 -.25 -8.2915 11.5625 -.25 -2.2 11.0868 -.25 -4.5924
  [3,16,18.755,-.25,-8.2915,11.5625,-.25,-2.2,11.0868,-.25,-4.5924],
// 4 16 12 -.25 -12 21.5662 -.25 -11.6778 18.755 -.25 -8.2915 11.0868 -.25 -4.5924
  [4,16,12,-.25,-12,21.5662,-.25,-11.6778,18.755,-.25,-8.2915,11.0868,-.25,-4.5924],
// 
// 3 16 -35 -.25 0 -35 -.25 -12 -21.5662 -.25 -11.6778
  [3,16,-35,-.25,0,-35,-.25,-12,-21.5662,-.25,-11.6778],
// 3 16 -35 -.25 12 -35 -.25 0 -21.5662 -.25 11.6778
  [3,16,-35,-.25,12,-35,-.25,0,-21.5662,-.25,11.6778],
// 3 16 35 -.25 -12 35 -.25 0 21.5662 -.25 -11.6778
  [3,16,35,-.25,-12,35,-.25,0,21.5662,-.25,-11.6778],
// 3 16 35 -.25 0 35 -.25 12 21.5662 -.25 11.6778
  [3,16,35,-.25,0,35,-.25,12,21.5662,-.25,11.6778],
];
module ldraw_lib__logo_train_2006_box(step=0, col=false, unit=2/5, alt=false, line=0.2, solid=!$preview)
    makepoly(ldraw_lib__logo_train_2006_box(), step=step, col=col, unit=unit, alt=alt, line=line, solid=solid);
ldraw_lib__logo_train_2006_box(line=0.2);
// file: ../p/box5-12.scad
use <../lib.scad>
function ldraw_lib__box5_12() = [
// 0 Box with 5 Faces without Any Edges
// 0 Name: box5-12.dat
// 0 Author: Chris Dee [cwdee]
// 0 !LDRAW_ORG Primitive UPDATE 2009-02
// 0 !LICENSE Licensed under CC BY 4.0 : see CAreadme.txt
// 
// 0 BFC CERTIFY CCW
  [0,"BFC","CERTIFY"],
  [0,"BFC","CCW"],
// 
// 0 !HISTORY 2009-09-03 [PTadmin] Official Update 2009-02
// 
// 
// 4 16 1 1 1 1 1 -1 -1 1 -1 -1 1 1
  [4,16,1,1,1,1,1,-1,-1,1,-1,-1,1,1],
// 4 16 -1 0 1 1 0 1 1 1 1 -1 1 1
  [4,16,-1,0,1,1,0,1,1,1,1,-1,1,1],
// 4 16 -1 0 -1 -1 0 1 -1 1 1 -1 1 -1
  [4,16,-1,0,-1,-1,0,1,-1,1,1,-1,1,-1],
// 4 16 1 0 -1 -1 0 -1 -1 1 -1 1 1 -1
  [4,16,1,0,-1,-1,0,-1,-1,1,-1,1,1,-1],
// 4 16 1 0 1 1 0 -1 1 1 -1 1 1 1
  [4,16,1,0,1,1,0,-1,1,1,-1,1,1,1],
// 0
];
module ldraw_lib__box5_12(step=0, col=false, unit=2/5, alt=false, line=0.2, solid=!$preview)
    makepoly(ldraw_lib__box5_12(), step=step, col=col, unit=unit, alt=alt, line=line, solid=solid);
ldraw_lib__box5_12(line=0.2);
// main file
use <../lib.scad>
use <../p/box5-12.scad>
use <../p/logo-train-2006-box.scad>
use <../p/logo-train-2006.scad>
function ldraw_lib__4296207f() = [
// 0 Sticker  0.7 x  2 with Light Bluish Grey Train Logo (2006)
// 0 Name: 4296207f.dat
// 0 Author: Gerald Lasser [GeraldLasser]
// 0 !LDRAW_ORG Part UPDATE 2023-07
// 0 !LICENSE Licensed under CC BY 4.0 : see CAreadme.txt
// 
// 0 BFC CERTIFY CCW
  [0,"BFC","CERTIFY"],
  [0,"BFC","CCW"],
// 
// 0 !KEYWORDS Set 7897
// 
// 0 !HISTORY 2023-12-31 [OrionP] Official Update 2023-07
// 
// 
// 1 16 0 -.25 0 20 0 0 0 .25 0 0 0 7.25 box5-12.dat
  [1,16,0,-.25,0,20,0,0,0,.25,0,0,0,7.25, ldraw_lib__box5_12()],
// 
// 1 71 0 0 0 .4571 0 0 0 1 0 0 0 .4571 logo-train-2006.dat
  [1,71,0,0,0,.4571,0,0,0,1,0,0,0,.4571, ldraw_lib__logo_train_2006()],
// 1 16 0 0 0 .4571 0 0 0 1 0 0 0 .4571 logo-train-2006-box.dat
  [1,16,0,0,0,.4571,0,0,0,1,0,0,0,.4571, ldraw_lib__logo_train_2006_box()],
// 
// 3 16 -20 -.25 7.25 -15.9985 -.25 5.4852 -9.85791002 -.25 5.33792238
  [3,16,-20,-.25,7.25,-15.9985,-.25,5.4852,-9.85791002,-.25,5.33792238],
// 3 16 -20 -.25 7.25 -9.85791002 -.25 5.33792238 -5.4852 -.25 5.4852
  [3,16,-20,-.25,7.25,-9.85791002,-.25,5.33792238,-5.4852,-.25,5.4852],
// 3 16 -20 -.25 7.25 -5.4852 -.25 5.4852 0 -.25 5.4852
  [3,16,-20,-.25,7.25,-5.4852,-.25,5.4852,0,-.25,5.4852],
// 3 16 -20 -.25 7.25 0 -.25 5.4852 20 -.25 7.25
  [3,16,-20,-.25,7.25,0,-.25,5.4852,20,-.25,7.25],
// 3 16 20 -.25 7.25 0 -.25 5.4852 5.4852 -.25 5.4852
  [3,16,20,-.25,7.25,0,-.25,5.4852,5.4852,-.25,5.4852],
// 3 16 20 -.25 7.25 5.4852 -.25 5.4852 9.85791002 -.25 5.33792238
  [3,16,20,-.25,7.25,5.4852,-.25,5.4852,9.85791002,-.25,5.33792238],
// 3 16 20 -.25 7.25 9.85791002 -.25 5.33792238 15.9985 -.25 5.4852
  [3,16,20,-.25,7.25,9.85791002,-.25,5.33792238,15.9985,-.25,5.4852],
// 3 16 15.9985 -.25 5.4852 15.9985 -.25 0 20 -.25 7.25
  [3,16,15.9985,-.25,5.4852,15.9985,-.25,0,20,-.25,7.25],
// 3 16 20 -.25 7.25 15.9985 -.25 0 20 -.25 -7.25
  [3,16,20,-.25,7.25,15.9985,-.25,0,20,-.25,-7.25],
// 3 16 20 -.25 -7.25 15.9985 -.25 0 15.9985 -.25 -5.4852
  [3,16,20,-.25,-7.25,15.9985,-.25,0,15.9985,-.25,-5.4852],
// 3 16 20 -.25 -7.25 15.9985 -.25 -5.4852 9.85791002 -.25 -5.33792238
  [3,16,20,-.25,-7.25,15.9985,-.25,-5.4852,9.85791002,-.25,-5.33792238],
// 3 16 20 -.25 -7.25 9.85791002 -.25 -5.33792238 5.4852 -.25 -5.4852
  [3,16,20,-.25,-7.25,9.85791002,-.25,-5.33792238,5.4852,-.25,-5.4852],
// 3 16 20 -.25 -7.25 5.4852 -.25 -5.4852 0 -.25 -5.4852
  [3,16,20,-.25,-7.25,5.4852,-.25,-5.4852,0,-.25,-5.4852],
// 3 16 20 -.25 -7.25 0 -.25 -5.4852 -20 -.25 -7.25
  [3,16,20,-.25,-7.25,0,-.25,-5.4852,-20,-.25,-7.25],
// 3 16 -20 -.25 -7.25 0 -.25 -5.4852 -5.4852 -.25 -5.4852
  [3,16,-20,-.25,-7.25,0,-.25,-5.4852,-5.4852,-.25,-5.4852],
// 3 16 -20 -.25 -7.25 -5.4852 -.25 -5.4852 -9.85791002 -.25 -5.33792238
  [3,16,-20,-.25,-7.25,-5.4852,-.25,-5.4852,-9.85791002,-.25,-5.33792238],
// 3 16 -20 -.25 -7.25 -9.85791002 -.25 -5.33792238 -15.9985 -.25 -5.4852
  [3,16,-20,-.25,-7.25,-9.85791002,-.25,-5.33792238,-15.9985,-.25,-5.4852],
// 3 16 -20 -.25 -7.25 -15.9985 -.25 -5.4852 -15.9985 -.25 0
  [3,16,-20,-.25,-7.25,-15.9985,-.25,-5.4852,-15.9985,-.25,0],
// 3 16 -20 -.25 -7.25 -15.9985 -.25 0 -20 -.25 7.25
  [3,16,-20,-.25,-7.25,-15.9985,-.25,0,-20,-.25,7.25],
// 3 16 -20 -.25 7.25 -15.9985 -.25 0 -15.9985 -.25 5.4852
  [3,16,-20,-.25,7.25,-15.9985,-.25,0,-15.9985,-.25,5.4852],
];
module ldraw_lib__4296207f(step=0, col=false, unit=2/5, alt=false, line=0.2, solid=!$preview)
    makepoly(ldraw_lib__4296207f(), step=step, col=col, unit=unit, alt=alt, line=line, solid=solid);
ldraw_lib__4296207f(line=0.2);
